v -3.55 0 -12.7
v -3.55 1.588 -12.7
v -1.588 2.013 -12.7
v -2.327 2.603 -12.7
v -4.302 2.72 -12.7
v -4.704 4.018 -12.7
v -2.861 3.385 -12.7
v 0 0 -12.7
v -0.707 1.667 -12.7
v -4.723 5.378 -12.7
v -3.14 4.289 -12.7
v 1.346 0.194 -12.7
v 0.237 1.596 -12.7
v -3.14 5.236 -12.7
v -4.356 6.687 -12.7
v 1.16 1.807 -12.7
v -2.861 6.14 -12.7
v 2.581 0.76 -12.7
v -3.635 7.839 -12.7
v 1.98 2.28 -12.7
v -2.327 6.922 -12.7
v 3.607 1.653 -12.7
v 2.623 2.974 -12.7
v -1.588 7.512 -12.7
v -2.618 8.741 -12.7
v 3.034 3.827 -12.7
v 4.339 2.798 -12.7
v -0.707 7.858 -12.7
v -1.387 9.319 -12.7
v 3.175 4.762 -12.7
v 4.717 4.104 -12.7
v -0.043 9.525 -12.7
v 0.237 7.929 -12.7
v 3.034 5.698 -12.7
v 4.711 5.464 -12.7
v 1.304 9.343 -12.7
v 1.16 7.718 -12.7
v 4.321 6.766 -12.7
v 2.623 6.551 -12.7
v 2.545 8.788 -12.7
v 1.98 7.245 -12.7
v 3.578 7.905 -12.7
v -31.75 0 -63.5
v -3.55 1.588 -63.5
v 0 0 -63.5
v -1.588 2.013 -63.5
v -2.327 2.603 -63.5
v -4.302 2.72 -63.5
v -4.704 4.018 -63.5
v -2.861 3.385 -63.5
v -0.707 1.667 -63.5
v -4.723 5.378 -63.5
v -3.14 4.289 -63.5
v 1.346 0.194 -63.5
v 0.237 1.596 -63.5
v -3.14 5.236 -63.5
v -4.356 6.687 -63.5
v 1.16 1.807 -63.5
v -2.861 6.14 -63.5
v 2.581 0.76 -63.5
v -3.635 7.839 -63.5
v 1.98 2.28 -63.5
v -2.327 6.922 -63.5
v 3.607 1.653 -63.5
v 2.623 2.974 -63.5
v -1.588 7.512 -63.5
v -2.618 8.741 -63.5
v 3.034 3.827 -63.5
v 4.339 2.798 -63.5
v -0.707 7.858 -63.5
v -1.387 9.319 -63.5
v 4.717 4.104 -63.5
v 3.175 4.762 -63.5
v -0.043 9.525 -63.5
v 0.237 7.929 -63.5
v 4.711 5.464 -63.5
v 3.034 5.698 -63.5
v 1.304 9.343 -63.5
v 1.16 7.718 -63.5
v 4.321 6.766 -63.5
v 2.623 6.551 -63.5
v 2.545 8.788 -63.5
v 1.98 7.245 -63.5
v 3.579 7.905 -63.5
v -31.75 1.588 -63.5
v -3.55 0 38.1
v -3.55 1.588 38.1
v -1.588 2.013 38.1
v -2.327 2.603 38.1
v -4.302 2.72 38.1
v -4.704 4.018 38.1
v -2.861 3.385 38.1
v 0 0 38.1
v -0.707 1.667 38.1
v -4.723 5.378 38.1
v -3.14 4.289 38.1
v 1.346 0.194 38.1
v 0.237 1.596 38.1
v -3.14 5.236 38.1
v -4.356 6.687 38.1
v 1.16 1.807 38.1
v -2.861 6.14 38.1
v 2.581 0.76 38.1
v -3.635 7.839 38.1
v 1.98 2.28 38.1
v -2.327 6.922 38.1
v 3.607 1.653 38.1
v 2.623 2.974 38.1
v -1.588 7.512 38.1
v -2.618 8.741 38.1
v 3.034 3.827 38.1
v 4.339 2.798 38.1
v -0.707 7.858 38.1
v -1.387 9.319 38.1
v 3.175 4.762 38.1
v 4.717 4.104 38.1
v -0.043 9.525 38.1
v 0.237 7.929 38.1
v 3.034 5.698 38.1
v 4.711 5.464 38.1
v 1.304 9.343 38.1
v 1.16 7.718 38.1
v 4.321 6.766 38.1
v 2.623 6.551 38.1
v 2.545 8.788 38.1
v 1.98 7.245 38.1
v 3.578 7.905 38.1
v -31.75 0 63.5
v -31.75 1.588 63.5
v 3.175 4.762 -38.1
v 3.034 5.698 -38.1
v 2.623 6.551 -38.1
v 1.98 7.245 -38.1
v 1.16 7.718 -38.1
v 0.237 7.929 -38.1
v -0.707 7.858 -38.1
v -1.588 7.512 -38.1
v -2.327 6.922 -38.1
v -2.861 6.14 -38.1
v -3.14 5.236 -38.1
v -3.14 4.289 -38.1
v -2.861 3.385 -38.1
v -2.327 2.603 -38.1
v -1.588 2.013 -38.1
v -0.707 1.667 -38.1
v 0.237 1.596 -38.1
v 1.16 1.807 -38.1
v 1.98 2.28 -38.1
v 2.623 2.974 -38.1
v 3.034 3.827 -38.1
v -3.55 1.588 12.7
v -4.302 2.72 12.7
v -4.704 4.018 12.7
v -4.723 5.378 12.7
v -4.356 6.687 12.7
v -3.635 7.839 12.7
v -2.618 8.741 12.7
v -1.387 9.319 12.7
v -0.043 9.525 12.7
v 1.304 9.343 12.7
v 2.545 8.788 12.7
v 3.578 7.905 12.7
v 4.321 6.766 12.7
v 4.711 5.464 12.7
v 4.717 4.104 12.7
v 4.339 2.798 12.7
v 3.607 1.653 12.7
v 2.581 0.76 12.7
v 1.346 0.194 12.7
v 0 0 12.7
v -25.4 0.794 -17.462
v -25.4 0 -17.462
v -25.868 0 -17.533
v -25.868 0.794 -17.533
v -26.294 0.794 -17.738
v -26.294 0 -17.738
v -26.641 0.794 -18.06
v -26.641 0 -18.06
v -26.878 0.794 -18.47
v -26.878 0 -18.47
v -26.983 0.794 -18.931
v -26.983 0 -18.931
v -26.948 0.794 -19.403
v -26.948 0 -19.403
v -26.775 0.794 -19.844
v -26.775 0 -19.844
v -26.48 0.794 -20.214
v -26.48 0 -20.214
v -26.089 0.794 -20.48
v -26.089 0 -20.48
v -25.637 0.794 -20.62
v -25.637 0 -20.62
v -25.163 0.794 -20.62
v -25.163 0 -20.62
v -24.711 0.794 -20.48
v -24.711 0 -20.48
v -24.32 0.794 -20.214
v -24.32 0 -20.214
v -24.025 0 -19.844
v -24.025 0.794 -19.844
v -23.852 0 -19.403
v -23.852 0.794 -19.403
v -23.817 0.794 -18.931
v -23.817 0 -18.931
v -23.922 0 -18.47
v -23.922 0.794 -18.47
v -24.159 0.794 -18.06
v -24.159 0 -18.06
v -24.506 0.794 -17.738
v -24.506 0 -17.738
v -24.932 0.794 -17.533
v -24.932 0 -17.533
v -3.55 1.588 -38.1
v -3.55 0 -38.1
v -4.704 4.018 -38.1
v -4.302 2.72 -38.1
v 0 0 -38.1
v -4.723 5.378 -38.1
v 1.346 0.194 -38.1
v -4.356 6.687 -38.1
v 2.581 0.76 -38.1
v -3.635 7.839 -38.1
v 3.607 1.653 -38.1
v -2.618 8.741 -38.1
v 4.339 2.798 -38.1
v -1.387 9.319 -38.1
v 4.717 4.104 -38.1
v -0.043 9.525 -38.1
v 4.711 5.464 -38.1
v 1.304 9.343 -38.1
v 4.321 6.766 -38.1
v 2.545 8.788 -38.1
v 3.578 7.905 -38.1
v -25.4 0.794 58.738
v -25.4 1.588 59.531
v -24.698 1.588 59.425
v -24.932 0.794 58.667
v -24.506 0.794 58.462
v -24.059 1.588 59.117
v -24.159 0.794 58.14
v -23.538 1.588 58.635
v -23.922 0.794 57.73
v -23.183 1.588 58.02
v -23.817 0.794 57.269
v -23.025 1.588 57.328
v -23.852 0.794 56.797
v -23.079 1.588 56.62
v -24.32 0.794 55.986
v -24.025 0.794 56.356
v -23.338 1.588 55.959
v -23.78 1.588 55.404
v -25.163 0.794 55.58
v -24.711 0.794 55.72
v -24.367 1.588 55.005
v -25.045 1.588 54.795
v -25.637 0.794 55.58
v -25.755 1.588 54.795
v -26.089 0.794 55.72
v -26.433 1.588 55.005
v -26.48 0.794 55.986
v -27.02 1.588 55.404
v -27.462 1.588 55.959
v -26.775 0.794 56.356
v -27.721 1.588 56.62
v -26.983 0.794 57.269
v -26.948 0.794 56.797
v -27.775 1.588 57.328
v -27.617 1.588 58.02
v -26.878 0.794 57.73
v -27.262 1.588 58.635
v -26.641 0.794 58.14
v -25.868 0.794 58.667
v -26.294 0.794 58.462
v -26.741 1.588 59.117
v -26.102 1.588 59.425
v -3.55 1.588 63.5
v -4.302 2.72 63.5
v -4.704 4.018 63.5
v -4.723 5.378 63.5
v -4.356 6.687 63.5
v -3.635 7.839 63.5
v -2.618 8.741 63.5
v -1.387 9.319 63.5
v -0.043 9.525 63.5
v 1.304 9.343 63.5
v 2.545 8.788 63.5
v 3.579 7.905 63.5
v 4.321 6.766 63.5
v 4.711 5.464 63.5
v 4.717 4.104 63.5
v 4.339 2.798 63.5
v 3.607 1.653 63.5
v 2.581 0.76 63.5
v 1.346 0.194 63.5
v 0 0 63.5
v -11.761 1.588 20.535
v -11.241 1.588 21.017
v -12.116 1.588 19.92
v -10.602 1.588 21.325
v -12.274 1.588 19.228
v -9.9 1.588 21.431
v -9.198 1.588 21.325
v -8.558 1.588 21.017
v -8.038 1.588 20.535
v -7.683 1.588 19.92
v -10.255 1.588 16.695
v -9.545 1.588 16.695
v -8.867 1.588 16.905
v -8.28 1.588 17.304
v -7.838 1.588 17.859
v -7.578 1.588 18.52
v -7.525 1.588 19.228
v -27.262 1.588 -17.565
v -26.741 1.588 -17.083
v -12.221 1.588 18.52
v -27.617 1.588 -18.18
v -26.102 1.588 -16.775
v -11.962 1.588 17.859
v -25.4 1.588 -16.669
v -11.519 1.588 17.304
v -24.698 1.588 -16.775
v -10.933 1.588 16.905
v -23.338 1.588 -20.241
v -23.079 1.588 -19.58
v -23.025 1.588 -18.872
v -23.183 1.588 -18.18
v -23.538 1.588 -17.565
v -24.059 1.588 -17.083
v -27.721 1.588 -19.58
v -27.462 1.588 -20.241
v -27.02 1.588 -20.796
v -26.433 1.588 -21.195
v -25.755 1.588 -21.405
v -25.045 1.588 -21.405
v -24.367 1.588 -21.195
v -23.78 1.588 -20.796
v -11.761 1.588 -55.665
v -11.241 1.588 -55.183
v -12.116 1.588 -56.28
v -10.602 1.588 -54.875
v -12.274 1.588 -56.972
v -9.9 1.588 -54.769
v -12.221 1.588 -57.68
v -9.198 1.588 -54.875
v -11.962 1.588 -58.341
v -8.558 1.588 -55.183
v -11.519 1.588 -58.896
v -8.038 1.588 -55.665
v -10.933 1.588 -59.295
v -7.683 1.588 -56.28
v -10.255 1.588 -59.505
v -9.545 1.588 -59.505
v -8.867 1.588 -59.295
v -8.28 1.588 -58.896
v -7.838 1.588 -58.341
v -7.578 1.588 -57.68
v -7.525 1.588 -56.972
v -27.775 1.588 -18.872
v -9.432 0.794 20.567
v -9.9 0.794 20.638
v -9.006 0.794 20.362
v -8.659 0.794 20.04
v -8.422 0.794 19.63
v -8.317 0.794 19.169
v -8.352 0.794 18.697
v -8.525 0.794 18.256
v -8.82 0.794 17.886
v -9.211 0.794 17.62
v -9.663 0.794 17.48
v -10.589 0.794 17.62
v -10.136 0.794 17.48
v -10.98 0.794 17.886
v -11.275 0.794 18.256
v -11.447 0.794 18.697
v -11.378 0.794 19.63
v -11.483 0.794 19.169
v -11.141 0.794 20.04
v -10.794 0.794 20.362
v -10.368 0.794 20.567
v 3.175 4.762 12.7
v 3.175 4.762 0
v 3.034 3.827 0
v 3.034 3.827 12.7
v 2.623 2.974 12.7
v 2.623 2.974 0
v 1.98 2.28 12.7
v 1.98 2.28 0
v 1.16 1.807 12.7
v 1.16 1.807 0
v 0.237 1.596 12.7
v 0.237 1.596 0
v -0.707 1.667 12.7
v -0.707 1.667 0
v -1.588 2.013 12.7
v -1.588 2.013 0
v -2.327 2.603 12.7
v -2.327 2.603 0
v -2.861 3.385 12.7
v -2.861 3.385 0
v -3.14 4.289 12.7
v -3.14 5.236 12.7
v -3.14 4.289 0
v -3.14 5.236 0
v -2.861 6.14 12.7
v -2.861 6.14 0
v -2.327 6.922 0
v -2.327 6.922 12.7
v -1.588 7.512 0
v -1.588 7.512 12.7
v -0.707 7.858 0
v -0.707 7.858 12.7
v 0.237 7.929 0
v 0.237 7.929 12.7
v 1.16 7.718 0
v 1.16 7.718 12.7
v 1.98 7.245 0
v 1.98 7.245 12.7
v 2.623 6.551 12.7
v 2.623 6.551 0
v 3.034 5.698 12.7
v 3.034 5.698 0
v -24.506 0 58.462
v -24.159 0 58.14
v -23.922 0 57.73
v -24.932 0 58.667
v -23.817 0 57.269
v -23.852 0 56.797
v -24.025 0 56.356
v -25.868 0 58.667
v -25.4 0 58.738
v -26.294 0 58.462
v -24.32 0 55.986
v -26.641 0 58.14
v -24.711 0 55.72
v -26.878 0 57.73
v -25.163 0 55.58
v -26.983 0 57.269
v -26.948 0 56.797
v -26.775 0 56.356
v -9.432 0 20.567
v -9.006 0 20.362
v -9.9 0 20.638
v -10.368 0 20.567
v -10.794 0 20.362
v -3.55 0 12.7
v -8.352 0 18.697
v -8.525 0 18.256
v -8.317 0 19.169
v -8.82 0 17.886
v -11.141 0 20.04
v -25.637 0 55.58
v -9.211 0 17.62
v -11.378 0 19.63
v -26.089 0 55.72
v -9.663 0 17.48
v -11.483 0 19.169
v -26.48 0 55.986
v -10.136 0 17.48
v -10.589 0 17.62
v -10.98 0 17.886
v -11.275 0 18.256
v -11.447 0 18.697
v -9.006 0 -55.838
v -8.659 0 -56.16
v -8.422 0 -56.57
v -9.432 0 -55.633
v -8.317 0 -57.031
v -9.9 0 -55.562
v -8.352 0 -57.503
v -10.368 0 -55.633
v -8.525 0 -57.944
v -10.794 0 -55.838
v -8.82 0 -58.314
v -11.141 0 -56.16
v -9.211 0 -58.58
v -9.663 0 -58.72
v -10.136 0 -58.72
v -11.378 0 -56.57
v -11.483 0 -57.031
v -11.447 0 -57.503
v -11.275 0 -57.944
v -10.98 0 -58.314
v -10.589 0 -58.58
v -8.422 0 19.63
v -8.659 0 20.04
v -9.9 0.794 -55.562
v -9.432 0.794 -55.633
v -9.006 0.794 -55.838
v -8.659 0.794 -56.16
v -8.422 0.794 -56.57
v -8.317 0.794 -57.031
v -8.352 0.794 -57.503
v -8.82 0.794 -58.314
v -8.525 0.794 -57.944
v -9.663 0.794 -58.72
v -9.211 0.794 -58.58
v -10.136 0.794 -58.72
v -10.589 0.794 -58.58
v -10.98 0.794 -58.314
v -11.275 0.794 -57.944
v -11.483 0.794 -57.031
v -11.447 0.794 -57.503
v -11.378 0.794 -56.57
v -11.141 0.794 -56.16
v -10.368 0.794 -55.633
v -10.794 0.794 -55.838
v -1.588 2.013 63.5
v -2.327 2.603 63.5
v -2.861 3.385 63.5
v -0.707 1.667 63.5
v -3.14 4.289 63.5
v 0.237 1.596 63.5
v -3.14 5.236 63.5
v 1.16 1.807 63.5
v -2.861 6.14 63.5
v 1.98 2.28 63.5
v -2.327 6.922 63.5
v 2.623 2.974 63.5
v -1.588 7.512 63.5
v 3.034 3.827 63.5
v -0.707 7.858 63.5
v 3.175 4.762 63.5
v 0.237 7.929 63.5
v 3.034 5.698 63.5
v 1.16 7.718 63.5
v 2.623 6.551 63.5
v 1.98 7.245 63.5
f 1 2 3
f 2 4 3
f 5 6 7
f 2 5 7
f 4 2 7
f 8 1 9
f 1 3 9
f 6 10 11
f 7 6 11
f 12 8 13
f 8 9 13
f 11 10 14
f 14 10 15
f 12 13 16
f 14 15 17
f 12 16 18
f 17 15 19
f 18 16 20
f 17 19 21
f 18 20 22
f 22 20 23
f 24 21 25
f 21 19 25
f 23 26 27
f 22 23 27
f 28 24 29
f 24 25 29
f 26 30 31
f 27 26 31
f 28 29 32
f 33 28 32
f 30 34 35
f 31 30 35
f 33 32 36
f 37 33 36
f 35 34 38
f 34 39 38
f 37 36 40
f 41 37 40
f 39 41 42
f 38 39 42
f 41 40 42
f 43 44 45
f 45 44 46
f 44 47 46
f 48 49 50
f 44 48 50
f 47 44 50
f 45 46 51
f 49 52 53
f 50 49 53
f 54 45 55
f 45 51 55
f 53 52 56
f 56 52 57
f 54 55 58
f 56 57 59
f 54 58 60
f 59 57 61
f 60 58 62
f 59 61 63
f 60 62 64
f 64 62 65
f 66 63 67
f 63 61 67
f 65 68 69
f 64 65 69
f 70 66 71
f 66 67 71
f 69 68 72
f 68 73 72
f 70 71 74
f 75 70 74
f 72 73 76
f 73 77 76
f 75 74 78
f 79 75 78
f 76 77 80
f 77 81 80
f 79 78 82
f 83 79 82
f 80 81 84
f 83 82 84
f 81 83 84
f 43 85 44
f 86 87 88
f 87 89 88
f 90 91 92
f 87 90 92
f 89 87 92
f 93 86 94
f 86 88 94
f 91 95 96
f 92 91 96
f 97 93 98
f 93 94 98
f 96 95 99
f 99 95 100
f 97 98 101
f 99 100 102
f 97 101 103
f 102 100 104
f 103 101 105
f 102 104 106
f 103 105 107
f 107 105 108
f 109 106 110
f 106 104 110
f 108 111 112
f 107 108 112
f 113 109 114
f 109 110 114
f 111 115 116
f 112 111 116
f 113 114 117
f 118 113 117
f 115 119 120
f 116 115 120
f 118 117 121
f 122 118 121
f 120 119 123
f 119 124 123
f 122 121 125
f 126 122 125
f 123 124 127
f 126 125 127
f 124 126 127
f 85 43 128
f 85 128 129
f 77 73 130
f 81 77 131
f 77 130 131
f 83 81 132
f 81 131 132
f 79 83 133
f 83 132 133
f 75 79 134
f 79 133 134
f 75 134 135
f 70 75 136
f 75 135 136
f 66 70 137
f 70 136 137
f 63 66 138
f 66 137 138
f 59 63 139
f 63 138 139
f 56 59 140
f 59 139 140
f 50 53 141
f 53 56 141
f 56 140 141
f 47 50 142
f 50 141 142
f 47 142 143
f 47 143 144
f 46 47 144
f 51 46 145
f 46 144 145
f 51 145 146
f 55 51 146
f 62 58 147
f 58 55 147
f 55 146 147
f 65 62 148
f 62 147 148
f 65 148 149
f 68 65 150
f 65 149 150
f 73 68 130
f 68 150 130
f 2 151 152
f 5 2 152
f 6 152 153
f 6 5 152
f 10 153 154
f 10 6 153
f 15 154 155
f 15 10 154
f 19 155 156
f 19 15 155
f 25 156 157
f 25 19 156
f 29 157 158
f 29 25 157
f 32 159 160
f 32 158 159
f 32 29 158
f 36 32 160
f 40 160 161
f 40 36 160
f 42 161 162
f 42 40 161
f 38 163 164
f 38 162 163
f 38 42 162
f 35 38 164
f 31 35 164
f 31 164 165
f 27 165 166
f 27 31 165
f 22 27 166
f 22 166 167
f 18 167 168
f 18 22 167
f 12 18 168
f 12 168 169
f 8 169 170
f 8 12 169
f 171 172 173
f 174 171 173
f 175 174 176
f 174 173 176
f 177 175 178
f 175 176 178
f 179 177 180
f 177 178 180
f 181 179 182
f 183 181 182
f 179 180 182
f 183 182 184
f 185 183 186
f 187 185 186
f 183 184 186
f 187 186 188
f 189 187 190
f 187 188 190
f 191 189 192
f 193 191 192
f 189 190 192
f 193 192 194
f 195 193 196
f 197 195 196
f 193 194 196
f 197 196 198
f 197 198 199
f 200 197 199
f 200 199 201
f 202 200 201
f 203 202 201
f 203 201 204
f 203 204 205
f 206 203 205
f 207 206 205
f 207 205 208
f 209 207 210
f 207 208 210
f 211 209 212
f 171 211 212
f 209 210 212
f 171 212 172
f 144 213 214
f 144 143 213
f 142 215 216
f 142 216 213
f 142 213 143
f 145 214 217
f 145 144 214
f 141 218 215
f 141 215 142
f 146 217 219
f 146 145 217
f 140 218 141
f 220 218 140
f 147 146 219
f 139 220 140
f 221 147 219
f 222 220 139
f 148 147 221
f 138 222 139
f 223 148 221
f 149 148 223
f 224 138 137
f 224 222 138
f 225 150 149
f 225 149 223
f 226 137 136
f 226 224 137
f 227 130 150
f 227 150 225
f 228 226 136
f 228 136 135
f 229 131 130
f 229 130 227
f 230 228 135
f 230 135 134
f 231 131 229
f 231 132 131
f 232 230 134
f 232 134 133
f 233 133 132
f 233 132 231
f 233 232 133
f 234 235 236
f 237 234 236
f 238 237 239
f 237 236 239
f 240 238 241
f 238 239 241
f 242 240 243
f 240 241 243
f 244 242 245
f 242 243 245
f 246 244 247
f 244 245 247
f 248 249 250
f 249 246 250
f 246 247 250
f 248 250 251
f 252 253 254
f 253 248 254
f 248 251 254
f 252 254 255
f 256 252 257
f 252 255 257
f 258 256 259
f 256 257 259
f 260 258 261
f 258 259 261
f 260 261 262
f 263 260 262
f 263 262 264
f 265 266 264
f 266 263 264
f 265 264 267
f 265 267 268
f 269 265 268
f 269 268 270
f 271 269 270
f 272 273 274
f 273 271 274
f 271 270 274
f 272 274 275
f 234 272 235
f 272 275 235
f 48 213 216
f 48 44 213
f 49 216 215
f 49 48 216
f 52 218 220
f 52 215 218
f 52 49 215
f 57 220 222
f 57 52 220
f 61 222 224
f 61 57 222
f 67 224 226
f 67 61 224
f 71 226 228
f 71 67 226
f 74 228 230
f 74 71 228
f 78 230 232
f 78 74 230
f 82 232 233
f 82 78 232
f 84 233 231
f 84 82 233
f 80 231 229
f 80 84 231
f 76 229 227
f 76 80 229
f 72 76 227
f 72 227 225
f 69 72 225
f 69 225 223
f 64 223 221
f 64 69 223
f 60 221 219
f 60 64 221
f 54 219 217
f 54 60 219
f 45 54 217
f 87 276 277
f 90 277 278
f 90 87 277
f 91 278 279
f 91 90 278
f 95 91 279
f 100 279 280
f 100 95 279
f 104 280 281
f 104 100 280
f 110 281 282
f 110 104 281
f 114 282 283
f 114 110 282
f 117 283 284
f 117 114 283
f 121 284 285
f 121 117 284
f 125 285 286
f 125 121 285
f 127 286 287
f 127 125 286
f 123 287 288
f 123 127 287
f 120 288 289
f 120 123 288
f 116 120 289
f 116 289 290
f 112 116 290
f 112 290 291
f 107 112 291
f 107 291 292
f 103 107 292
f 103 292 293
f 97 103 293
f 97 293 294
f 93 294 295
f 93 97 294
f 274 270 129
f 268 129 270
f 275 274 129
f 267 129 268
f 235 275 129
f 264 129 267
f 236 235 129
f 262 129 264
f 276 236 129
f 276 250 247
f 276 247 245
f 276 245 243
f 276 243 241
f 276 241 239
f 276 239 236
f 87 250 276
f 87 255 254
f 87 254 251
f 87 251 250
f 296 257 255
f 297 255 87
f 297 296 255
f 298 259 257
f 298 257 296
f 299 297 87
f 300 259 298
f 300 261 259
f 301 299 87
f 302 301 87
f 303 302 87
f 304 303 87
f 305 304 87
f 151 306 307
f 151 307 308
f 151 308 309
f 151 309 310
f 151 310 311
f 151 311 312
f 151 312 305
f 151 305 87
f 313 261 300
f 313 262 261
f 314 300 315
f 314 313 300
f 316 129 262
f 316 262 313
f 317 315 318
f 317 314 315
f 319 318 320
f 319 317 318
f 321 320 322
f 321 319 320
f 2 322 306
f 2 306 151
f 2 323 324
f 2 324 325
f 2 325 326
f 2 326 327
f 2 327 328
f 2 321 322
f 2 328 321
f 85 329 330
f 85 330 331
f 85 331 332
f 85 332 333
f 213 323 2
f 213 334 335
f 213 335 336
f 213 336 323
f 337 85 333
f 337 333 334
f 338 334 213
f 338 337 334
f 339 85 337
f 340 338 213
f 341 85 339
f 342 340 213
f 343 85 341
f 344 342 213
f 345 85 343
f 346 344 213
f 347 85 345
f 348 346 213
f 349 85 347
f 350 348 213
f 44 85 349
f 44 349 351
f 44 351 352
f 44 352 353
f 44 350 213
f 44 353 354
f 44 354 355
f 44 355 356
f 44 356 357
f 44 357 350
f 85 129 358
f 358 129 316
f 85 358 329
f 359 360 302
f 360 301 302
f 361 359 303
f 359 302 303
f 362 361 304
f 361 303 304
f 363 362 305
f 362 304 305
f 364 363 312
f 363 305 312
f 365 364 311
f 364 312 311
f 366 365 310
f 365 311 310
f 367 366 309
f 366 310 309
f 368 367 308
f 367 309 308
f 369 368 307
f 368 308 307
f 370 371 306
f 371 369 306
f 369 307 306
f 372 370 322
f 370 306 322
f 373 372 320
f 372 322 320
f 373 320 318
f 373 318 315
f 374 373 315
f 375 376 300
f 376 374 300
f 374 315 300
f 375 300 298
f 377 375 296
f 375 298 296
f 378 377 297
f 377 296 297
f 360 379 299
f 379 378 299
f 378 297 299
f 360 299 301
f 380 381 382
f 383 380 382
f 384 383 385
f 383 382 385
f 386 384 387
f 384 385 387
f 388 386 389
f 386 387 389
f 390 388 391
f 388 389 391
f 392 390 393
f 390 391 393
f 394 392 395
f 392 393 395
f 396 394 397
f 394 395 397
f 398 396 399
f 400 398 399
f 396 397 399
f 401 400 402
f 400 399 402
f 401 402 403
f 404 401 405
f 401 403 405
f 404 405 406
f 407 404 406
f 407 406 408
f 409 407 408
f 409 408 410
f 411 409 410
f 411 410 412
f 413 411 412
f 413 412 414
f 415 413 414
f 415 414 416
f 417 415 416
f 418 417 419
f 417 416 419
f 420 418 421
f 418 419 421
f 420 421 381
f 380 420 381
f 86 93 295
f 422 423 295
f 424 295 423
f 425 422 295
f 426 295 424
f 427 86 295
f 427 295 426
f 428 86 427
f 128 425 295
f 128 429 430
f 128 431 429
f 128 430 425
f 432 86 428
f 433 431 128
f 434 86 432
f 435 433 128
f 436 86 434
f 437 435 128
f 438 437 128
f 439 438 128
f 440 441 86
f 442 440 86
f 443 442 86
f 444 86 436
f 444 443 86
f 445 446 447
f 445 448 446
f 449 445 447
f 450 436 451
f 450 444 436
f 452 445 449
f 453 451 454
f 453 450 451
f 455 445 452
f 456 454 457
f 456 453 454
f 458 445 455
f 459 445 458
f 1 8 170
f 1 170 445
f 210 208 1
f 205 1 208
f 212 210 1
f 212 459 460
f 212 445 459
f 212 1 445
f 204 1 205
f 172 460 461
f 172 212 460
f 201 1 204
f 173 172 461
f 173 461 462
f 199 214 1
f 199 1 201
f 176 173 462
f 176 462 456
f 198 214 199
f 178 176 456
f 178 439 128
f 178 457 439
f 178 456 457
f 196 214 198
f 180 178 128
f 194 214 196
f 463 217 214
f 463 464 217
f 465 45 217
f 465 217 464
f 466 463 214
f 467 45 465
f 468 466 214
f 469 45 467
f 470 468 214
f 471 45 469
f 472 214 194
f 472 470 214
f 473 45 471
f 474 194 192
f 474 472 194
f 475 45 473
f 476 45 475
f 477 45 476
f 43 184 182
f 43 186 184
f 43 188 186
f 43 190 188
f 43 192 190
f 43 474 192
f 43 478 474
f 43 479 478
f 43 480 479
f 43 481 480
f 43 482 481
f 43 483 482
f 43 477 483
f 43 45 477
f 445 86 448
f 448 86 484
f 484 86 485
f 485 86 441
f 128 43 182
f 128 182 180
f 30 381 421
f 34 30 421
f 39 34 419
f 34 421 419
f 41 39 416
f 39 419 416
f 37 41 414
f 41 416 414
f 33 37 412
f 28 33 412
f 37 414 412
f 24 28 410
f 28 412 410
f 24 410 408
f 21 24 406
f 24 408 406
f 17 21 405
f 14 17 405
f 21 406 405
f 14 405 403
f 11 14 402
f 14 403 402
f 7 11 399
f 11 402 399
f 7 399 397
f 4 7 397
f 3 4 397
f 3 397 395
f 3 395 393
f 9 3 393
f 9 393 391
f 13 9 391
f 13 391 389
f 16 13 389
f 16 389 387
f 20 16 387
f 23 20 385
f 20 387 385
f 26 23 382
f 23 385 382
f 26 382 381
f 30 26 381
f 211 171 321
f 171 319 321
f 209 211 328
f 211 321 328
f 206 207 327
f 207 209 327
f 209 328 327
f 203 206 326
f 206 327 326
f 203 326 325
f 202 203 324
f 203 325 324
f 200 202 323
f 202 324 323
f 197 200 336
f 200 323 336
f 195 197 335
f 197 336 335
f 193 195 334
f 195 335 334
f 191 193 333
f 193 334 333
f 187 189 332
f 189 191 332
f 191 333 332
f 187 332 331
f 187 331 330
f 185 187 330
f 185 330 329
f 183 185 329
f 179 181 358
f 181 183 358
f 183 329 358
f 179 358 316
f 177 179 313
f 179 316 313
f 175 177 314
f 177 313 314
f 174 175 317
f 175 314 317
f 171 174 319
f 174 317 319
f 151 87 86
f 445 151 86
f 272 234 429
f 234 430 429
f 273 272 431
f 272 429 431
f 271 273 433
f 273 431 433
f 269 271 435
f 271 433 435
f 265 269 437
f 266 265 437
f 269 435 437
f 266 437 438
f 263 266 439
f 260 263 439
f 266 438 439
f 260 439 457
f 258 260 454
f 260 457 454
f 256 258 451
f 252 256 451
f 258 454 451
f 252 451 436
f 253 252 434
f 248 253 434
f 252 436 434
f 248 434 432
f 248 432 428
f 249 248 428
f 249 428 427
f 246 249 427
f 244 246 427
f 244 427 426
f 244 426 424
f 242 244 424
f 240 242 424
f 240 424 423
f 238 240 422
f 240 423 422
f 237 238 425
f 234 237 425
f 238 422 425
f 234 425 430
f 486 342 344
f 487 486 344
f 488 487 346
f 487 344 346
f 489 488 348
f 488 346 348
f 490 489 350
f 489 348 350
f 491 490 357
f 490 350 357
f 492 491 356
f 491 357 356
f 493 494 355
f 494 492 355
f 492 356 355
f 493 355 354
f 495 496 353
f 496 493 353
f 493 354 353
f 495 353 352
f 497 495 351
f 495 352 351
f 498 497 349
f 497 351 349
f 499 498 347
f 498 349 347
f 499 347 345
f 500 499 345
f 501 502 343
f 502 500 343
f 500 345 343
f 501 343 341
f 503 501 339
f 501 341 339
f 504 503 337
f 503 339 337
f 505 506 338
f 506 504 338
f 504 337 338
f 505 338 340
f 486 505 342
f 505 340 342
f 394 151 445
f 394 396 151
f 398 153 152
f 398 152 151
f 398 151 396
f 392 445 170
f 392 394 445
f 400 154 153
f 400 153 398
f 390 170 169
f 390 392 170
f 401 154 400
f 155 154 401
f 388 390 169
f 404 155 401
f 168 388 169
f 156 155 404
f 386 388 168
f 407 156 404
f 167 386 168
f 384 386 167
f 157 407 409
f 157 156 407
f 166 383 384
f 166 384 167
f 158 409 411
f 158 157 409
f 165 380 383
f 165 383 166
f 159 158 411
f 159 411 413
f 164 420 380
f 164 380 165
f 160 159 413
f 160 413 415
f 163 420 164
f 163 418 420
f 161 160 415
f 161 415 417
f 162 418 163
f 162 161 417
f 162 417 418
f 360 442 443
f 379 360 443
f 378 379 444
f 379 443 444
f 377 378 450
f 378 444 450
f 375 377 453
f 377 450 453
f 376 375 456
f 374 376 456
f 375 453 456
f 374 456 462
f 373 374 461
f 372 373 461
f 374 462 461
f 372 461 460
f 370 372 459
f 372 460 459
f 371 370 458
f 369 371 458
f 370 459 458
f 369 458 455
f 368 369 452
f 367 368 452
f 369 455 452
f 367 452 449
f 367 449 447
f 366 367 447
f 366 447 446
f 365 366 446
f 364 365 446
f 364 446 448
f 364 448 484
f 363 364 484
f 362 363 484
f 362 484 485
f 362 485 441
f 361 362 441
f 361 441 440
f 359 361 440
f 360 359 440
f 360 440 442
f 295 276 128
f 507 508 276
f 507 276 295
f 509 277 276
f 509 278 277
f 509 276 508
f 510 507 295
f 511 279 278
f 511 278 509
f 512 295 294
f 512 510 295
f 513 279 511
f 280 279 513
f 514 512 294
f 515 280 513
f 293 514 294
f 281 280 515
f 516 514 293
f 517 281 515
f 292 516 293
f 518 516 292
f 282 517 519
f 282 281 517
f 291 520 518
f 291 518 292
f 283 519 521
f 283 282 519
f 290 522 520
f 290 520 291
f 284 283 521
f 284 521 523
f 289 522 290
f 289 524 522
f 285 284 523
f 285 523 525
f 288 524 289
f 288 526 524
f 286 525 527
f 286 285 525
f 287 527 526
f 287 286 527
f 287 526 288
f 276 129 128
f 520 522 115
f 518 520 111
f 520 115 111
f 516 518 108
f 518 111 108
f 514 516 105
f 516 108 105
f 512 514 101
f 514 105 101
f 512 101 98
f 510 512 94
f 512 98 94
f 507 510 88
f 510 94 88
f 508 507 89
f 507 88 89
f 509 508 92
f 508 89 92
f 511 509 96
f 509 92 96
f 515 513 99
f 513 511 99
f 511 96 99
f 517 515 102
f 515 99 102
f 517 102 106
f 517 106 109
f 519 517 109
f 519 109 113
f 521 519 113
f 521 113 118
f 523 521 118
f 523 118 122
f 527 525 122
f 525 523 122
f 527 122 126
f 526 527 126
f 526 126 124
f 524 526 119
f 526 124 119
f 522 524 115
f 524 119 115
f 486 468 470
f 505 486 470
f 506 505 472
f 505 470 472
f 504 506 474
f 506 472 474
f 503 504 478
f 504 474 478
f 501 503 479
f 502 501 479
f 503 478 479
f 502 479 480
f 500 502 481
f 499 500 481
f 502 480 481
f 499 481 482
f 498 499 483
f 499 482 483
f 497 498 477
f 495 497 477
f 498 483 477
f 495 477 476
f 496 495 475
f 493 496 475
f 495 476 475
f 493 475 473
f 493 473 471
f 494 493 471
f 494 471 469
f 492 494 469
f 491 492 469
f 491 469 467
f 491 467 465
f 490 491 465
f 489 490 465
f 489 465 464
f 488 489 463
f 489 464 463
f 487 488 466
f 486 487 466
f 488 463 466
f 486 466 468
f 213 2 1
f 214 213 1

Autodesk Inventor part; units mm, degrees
ref_plane "YZ Plane" through (0, 0, 0) normal (1, 0, 0) x (0, 1, 0)
ref_plane "XZ Plane" through (0, 0, 0) normal (0, 1, 0) x (-1, 0, 0)
sketch "Sketch1" plane through (0, 0, 0) normal (0, 0, 1) x (1, 0, 0)
  line L0 (0, 0) -> (-31.75, 0)
  line L1 (-31.75, 0) -> (-31.75, 1.5875)
  line L2 (-31.75, 1.5875) -> (0, 1.5875)
  line L3 (0, 1.5875) -> (0, 0)
  circle A0 centre (0, 4.7625) radius 4.7625
  circle A1 centre (0, 4.7625) radius 3.175
  dimension "d0" = 31.75
  dimension "d1" = 1.5875
  dimension "d2" = 9.525
  dimension "d3" = 6.35
extrude "Extrusion1" add sketch "Sketch1" along normal mid plane 127
ref_plane "Work Plane1" through (0, 0, 38.1) normal (0, 0, 1) x (1, 0, 0)
sketch "Sketch2" plane through (0, 0, 38.1) normal (0, 0, 1) x (1, 0, 0)
  arc A0 (0, 0) -> (-3.5498, 1.5875) centre (0, 4.7625) ccw projected
  line L0 (-3.5498, 1.5875) -> (-3.5498, 0)
  line L1 (-3.5498, 0) -> (0, 0)
extrude "Extrusion2" cut sketch "Sketch2" against normal blind 25.4
pattern_linear "Rectangular Pattern1" count 2 spacing 50.8 along (0, 0, -1) of "Extrusion2"
sketch "Sketch3" plane through (-31.75, 1.5875, -63.5) normal (0, 1, 0) x (1, 0, 0)
  line L0 (28.2002, 0) -> (0, 0) construction
  line L1 (0, -127) -> (28.2002, -127) construction
  line L2 (0, 0) -> (28.2002, 0) construction
  line L3 (28.2002, 0) -> (28.2002, -127) construction
  line L4 (28.2002, -127) -> (0, -127) construction
  line L5 (0, -127) -> (0, 0) construction
  line L6 (21.8502, -120.65) -> (21.8502, -6.35) construction
  line L7 (21.8502, -6.35) -> (6.35, -6.35) construction
  line L8 (6.35, -6.35) -> (6.35, -120.65) construction
  line L9 (6.35, -120.65) -> (21.8502, -120.65) construction
  line L10 (6.35, -82.55) -> (21.8502, -82.55) construction
  line L11 (6.35, -44.45) -> (21.8502, -44.45) construction
  line L12 (6.35, -6.35) -> (21.8502, -6.35) construction
  point P0 (31.75, -63.5)
  dimension "d12" = 6.35
  dimension "d15" = 114.3
hole "Hole1" at (-9.8998, 1.5875, -57.15) at (-25.4, 1.5875, 57.15) at (-9.8998, 1.5875, 19.05) at (-25.4, 1.5875, -19.05) direction (0, -1, 0) diameter 3.175 end through all
chamfer "Chamfer1" distance 0.7937 angle 45 4 edges at (-25.4, 1.5875, 55.5625) (-9.8998, 1.5875, 17.4625) (-25.4, 1.5875, -20.6375) (-9.8998, 1.5875, -58.7375)
